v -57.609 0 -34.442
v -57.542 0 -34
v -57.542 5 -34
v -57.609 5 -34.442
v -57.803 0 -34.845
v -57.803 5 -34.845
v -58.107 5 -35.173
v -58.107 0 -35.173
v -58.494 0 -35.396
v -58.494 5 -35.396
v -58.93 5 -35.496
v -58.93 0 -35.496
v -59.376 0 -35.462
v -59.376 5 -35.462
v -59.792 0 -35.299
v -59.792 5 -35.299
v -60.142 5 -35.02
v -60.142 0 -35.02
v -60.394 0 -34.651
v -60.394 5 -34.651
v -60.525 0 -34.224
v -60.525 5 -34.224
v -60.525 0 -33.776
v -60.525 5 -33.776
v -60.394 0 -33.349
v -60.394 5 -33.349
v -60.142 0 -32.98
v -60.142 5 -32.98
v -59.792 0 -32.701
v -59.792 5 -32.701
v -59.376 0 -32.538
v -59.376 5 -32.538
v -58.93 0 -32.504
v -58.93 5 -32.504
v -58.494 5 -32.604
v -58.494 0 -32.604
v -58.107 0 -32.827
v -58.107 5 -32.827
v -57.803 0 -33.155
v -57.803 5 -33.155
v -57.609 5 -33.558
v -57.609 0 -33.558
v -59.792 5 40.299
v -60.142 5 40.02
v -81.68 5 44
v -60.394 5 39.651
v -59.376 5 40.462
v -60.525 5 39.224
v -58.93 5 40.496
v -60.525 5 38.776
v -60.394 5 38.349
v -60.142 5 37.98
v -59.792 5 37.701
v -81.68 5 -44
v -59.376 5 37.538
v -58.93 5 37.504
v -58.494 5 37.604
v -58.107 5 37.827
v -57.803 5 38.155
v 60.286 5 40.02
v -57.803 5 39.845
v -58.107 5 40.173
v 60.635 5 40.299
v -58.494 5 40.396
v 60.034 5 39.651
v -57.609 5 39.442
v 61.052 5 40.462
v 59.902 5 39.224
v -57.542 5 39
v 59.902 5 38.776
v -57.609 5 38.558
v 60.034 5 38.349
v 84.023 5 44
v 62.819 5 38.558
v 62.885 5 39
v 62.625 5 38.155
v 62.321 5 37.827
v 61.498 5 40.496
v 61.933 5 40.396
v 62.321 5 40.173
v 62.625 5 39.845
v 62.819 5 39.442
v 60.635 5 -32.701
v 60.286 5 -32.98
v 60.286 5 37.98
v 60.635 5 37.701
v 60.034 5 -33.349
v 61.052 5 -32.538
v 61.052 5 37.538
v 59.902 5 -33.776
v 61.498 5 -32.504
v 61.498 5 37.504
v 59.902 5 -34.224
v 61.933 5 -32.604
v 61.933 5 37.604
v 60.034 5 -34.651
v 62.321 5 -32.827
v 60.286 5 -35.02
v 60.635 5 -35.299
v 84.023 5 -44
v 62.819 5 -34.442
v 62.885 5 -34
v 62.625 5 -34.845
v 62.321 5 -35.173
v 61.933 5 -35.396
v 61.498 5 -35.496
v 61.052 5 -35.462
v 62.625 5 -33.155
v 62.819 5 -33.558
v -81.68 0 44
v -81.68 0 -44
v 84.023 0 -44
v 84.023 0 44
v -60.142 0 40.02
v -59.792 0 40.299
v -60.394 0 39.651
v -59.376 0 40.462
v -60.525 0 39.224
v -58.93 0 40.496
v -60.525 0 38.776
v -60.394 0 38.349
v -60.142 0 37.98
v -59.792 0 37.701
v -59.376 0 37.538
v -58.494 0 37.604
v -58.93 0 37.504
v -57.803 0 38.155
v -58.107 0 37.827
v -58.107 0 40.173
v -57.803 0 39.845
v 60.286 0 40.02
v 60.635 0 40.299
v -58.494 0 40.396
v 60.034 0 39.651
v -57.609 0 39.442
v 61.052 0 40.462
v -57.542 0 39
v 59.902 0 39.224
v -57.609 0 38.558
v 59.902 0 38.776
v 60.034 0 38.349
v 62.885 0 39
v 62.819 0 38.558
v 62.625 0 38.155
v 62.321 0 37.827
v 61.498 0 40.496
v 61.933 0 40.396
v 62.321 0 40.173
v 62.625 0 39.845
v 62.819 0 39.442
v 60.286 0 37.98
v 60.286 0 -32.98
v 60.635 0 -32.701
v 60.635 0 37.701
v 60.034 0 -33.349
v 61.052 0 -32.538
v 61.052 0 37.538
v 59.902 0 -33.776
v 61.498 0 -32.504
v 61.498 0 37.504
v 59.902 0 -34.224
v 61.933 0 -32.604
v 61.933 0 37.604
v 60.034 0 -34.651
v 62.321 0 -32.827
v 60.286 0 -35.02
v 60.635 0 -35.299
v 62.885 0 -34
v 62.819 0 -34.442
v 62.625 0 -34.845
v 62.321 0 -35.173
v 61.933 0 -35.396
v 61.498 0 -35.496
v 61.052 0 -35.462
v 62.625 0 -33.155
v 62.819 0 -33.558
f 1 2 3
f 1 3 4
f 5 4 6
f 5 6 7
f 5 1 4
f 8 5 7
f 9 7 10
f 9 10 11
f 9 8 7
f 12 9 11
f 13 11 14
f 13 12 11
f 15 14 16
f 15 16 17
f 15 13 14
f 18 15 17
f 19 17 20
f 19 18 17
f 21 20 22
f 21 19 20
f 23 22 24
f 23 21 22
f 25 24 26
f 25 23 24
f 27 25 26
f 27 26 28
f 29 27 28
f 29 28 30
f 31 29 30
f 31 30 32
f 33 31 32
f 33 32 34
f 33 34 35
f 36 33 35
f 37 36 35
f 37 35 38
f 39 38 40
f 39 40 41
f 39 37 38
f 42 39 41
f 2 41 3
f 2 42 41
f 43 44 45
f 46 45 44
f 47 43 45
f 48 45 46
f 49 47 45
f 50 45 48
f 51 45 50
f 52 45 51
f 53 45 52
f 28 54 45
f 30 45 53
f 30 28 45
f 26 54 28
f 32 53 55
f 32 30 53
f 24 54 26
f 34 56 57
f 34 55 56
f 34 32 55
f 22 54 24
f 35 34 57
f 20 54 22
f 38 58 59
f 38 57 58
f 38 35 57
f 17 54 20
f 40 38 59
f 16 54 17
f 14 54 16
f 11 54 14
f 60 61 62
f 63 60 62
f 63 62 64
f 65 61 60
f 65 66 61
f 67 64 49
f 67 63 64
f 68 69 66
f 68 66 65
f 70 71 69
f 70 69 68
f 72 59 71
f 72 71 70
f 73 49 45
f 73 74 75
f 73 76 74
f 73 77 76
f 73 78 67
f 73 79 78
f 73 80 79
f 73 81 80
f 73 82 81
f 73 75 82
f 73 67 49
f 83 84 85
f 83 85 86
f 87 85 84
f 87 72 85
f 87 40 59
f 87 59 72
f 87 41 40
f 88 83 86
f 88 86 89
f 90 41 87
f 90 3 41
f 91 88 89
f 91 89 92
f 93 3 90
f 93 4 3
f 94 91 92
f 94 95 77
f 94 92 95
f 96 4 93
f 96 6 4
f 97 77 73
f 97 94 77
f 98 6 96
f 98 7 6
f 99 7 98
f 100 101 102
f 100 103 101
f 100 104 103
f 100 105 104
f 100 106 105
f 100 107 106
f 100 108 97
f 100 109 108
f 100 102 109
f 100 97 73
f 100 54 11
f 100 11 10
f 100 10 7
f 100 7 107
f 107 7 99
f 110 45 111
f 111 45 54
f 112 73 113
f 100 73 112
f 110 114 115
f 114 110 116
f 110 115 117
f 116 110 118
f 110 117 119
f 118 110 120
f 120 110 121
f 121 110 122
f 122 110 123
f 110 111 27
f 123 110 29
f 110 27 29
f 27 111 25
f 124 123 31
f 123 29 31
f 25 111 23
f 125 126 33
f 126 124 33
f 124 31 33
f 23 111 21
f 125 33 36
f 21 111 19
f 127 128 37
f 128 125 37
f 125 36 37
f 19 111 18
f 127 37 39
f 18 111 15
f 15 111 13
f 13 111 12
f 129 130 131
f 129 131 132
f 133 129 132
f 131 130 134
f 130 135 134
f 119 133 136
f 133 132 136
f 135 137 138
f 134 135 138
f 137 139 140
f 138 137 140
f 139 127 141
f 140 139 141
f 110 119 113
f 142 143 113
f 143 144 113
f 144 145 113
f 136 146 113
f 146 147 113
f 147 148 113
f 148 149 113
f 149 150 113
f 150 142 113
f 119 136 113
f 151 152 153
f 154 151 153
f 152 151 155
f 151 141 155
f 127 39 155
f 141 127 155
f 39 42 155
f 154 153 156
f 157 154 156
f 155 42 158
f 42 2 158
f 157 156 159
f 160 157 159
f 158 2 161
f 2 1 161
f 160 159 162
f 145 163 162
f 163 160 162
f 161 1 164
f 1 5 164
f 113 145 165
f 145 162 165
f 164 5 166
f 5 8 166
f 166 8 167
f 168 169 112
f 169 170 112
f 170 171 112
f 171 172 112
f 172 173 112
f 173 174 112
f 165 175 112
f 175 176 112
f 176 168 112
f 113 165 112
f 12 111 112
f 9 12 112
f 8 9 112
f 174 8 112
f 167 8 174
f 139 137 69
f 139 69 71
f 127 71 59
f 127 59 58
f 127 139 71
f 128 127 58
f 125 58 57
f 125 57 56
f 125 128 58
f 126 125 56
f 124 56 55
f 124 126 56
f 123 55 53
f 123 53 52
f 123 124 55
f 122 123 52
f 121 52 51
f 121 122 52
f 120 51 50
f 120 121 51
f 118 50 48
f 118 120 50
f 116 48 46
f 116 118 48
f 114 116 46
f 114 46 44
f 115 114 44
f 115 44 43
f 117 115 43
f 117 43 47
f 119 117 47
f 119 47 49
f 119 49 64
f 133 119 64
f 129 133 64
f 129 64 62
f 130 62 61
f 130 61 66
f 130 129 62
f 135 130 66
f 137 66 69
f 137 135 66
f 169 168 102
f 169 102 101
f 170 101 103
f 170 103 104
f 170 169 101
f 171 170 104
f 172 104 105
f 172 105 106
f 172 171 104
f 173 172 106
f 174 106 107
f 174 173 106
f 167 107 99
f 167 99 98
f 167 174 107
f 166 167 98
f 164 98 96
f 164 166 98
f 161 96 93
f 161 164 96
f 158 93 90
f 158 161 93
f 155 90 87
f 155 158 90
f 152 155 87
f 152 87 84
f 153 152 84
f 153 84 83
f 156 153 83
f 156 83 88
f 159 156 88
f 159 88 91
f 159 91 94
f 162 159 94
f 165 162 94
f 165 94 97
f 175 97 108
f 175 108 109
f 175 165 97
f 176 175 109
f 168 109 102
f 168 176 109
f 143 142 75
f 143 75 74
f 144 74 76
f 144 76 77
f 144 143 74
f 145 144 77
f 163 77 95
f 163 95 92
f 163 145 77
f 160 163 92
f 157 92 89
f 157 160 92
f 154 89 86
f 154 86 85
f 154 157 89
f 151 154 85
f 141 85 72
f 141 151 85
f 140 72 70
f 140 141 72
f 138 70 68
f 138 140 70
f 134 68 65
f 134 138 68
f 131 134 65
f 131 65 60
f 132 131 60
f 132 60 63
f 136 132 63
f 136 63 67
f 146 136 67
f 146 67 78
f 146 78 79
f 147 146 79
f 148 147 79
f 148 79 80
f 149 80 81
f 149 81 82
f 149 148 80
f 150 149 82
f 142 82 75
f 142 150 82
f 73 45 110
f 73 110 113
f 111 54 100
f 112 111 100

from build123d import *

# Parameters (mm, degrees)
SKETCH1_W           = 155.702807198
SKETCH1_H           = 58
SKETCH1_R           = 1.5
BOSS_EXTRUDE2_DEPTH = 5
SKETCH2_W           = 5
SKETCH2_H           = 88
BOSS_EXTRUDE3_DEPTH = 5


with BuildPart() as part:
    # Sketch1 → Boss-Extrude2 (new body)
    with BuildSketch(Plane(origin=(0, 0, 0), x_dir=(1, 0, 0), z_dir=(0, 1, 0))):
        with Locations((1.171695753, -5)):
            Rectangle(SKETCH1_W, SKETCH1_H)
        Polygon((-76.679707846, 44), (-76.679707846, 24), (79.023099352, 24), (79.023099352, 44), (62.885457038, 44), (59.885457038, 44), (-57.542065533, 44), (-60.542065533, 44), align=None)
        with Locations((-59.042065533, 34)):
            Circle(SKETCH1_R, mode=Mode.SUBTRACT)
        with Locations((61.385457038, 34)):
            Circle(SKETCH1_R, mode=Mode.SUBTRACT)
        Polygon((-76.679707846, -44), (-60.542065533, -44), (-57.542065533, -44), (59.885457038, -44), (62.885457038, -44), (79.023099352, -44), (79.023099352, -34), (-76.679707846, -34), align=None)
        with Locations((-59.042065533, -39)):
            Circle(SKETCH1_R, mode=Mode.SUBTRACT)
        with Locations((61.385457038, -39)):
            Circle(SKETCH1_R, mode=Mode.SUBTRACT)
    extrude(amount=BOSS_EXTRUDE2_DEPTH)

    # Sketch2 → Boss-Extrude3 (add)
    with BuildSketch(Plane(origin=(0, 5, 0), x_dir=(1, 0, 0), z_dir=(0, 1, 0))):
        with Locations((81.523099352, 0)):
            Rectangle(SKETCH2_W, SKETCH2_H)
        with Locations((-79.179707846, 0)):
            Rectangle(SKETCH2_W, SKETCH2_H)
    extrude(amount=-BOSS_EXTRUDE3_DEPTH)


solid = part.part
